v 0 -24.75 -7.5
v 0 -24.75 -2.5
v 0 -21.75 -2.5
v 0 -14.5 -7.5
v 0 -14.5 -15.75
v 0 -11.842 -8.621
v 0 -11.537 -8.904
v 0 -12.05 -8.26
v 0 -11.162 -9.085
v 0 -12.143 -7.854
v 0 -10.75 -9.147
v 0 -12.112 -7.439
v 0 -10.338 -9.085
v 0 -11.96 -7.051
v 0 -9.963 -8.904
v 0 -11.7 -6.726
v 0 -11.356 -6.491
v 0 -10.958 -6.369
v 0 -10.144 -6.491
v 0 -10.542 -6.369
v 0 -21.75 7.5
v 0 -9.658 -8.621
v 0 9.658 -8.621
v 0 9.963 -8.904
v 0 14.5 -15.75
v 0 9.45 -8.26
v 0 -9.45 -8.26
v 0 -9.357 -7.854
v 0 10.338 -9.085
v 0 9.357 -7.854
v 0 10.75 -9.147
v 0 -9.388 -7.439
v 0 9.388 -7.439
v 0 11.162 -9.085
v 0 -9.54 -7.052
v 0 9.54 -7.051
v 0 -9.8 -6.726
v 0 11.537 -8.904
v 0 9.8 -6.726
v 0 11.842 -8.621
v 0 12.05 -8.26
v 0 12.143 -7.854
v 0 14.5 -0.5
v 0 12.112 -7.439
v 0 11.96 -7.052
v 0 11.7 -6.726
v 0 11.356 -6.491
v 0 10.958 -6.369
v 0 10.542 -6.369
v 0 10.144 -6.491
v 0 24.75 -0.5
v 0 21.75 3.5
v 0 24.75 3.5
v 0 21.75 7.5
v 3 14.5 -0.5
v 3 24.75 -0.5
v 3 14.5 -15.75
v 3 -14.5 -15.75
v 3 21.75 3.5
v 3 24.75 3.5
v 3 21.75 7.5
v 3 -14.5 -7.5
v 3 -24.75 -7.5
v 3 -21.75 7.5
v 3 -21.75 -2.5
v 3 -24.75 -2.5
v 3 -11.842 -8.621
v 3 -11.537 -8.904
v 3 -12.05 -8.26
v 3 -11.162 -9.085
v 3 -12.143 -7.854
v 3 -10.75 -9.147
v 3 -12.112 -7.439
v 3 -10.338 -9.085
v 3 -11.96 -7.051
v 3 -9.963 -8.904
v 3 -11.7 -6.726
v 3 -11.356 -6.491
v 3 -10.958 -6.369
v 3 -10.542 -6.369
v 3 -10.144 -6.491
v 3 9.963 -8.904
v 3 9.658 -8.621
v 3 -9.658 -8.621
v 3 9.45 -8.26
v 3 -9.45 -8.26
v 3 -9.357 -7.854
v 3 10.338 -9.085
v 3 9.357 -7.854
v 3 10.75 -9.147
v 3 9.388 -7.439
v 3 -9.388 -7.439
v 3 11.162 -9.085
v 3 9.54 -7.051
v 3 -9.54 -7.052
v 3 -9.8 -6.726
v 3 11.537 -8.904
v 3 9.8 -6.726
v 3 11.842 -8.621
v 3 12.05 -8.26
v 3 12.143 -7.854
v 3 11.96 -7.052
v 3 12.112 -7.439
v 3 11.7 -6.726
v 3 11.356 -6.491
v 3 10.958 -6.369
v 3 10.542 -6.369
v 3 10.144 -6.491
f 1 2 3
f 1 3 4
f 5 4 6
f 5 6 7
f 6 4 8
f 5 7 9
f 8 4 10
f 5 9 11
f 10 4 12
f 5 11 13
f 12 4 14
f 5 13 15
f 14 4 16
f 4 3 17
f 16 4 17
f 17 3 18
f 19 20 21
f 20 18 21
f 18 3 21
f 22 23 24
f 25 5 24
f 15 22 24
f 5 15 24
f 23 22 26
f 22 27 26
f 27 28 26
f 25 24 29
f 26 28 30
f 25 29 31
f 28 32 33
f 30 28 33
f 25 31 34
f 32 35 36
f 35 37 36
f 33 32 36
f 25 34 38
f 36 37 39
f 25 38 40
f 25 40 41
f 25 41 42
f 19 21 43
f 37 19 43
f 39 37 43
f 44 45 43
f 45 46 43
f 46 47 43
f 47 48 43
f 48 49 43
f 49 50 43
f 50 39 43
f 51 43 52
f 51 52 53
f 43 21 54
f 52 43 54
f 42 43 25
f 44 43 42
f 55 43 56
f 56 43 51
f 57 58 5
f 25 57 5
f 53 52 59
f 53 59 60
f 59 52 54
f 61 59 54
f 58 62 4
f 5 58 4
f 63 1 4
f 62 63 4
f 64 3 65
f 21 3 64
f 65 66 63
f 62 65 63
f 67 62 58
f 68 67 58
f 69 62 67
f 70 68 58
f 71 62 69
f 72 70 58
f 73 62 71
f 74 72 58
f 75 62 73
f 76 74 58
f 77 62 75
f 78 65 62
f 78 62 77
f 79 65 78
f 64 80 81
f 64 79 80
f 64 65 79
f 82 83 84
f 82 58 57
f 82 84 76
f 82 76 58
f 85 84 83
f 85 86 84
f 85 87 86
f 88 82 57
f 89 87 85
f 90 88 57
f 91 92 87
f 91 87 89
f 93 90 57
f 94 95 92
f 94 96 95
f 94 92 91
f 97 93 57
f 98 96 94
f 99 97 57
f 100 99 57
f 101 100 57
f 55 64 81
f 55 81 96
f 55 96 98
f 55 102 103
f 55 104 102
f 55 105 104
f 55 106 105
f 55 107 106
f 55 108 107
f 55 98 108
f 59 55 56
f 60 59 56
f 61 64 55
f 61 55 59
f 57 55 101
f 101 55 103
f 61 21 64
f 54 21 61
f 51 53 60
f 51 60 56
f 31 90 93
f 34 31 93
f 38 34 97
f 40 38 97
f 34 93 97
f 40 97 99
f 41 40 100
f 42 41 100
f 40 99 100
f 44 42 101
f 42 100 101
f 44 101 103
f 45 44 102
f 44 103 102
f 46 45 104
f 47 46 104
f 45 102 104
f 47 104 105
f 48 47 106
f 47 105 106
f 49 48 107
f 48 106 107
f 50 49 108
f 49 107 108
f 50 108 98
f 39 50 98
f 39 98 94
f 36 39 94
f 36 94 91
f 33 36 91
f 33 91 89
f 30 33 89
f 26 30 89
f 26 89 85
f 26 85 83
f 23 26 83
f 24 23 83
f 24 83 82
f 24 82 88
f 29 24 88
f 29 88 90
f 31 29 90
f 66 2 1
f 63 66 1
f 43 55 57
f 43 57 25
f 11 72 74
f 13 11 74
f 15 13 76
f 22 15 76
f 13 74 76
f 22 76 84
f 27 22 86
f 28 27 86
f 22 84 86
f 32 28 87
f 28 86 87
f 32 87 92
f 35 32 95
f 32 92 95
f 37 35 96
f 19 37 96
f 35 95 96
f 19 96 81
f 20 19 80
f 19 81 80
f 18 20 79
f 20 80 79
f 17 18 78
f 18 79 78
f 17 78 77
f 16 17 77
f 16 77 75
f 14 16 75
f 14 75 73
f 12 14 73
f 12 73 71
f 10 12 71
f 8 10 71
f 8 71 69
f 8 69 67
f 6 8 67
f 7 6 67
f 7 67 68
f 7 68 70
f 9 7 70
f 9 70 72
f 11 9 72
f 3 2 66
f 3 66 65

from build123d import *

# Parameters (mm, degrees)
SKETCH1_W             = 15
SKETCH1_H             = 49.5
BOSS_EXTRUDE1_DEPTH   = 3
SKETCH2_W             = 10
SKETCH2_H             = 3
SKETCH2_W_2           = 7
SKETCH2_H_2           = 10.25
SKETCH2_W_3           = 4
CUT_EXTRUDE1_DEPTH    = 27.034832437
SKETCH3_W             = 3
SKETCH3_H             = 29
BOSS_EXTRUDE2_DEPTH   = 8.25
F_3_CLEARANCE_HOLE1_D = 2.794


with BuildPart() as part:
    # Sketch1 → Boss-Extrude1 (new body)
    with BuildSketch(Plane(origin=(0, 0, 0), x_dir=(0, 0, -1), z_dir=(1, 0, 0))):
        Rectangle(SKETCH1_W, SKETCH1_H)
    extrude(amount=BOSS_EXTRUDE1_DEPTH)

    # Sketch2 → Cut-Extrude1 (cut, through all)
    with BuildSketch(Plane.ZY):
        with Locations((2.5, -23.25)):
            Rectangle(SKETCH2_W, SKETCH2_H)
        with Locations((-4, 19.625)):
            Rectangle(SKETCH2_W_2, SKETCH2_H_2)
        with Locations((5.5, 23.25)):
            Rectangle(SKETCH2_W_3, SKETCH2_H)
    extrude(amount=-CUT_EXTRUDE1_DEPTH, mode=Mode.SUBTRACT)

    # Sketch3 → Boss-Extrude2 (add)
    with BuildSketch(Plane(origin=(0, 0, -7.5), x_dir=(-1, 0, 0), z_dir=(0, 0, -1))):
        with Locations((-1.5, 0)):
            Rectangle(SKETCH3_W, SKETCH3_H)
    extrude(amount=BOSS_EXTRUDE2_DEPTH)

    # #3 Clearance Hole1 (through all)
    with Locations(Plane.ZY):
        with Locations((-7.75, 10.75), (-7.75, -10.75)):
            Hole(F_3_CLEARANCE_HOLE1_D / 2)


solid = part.part
